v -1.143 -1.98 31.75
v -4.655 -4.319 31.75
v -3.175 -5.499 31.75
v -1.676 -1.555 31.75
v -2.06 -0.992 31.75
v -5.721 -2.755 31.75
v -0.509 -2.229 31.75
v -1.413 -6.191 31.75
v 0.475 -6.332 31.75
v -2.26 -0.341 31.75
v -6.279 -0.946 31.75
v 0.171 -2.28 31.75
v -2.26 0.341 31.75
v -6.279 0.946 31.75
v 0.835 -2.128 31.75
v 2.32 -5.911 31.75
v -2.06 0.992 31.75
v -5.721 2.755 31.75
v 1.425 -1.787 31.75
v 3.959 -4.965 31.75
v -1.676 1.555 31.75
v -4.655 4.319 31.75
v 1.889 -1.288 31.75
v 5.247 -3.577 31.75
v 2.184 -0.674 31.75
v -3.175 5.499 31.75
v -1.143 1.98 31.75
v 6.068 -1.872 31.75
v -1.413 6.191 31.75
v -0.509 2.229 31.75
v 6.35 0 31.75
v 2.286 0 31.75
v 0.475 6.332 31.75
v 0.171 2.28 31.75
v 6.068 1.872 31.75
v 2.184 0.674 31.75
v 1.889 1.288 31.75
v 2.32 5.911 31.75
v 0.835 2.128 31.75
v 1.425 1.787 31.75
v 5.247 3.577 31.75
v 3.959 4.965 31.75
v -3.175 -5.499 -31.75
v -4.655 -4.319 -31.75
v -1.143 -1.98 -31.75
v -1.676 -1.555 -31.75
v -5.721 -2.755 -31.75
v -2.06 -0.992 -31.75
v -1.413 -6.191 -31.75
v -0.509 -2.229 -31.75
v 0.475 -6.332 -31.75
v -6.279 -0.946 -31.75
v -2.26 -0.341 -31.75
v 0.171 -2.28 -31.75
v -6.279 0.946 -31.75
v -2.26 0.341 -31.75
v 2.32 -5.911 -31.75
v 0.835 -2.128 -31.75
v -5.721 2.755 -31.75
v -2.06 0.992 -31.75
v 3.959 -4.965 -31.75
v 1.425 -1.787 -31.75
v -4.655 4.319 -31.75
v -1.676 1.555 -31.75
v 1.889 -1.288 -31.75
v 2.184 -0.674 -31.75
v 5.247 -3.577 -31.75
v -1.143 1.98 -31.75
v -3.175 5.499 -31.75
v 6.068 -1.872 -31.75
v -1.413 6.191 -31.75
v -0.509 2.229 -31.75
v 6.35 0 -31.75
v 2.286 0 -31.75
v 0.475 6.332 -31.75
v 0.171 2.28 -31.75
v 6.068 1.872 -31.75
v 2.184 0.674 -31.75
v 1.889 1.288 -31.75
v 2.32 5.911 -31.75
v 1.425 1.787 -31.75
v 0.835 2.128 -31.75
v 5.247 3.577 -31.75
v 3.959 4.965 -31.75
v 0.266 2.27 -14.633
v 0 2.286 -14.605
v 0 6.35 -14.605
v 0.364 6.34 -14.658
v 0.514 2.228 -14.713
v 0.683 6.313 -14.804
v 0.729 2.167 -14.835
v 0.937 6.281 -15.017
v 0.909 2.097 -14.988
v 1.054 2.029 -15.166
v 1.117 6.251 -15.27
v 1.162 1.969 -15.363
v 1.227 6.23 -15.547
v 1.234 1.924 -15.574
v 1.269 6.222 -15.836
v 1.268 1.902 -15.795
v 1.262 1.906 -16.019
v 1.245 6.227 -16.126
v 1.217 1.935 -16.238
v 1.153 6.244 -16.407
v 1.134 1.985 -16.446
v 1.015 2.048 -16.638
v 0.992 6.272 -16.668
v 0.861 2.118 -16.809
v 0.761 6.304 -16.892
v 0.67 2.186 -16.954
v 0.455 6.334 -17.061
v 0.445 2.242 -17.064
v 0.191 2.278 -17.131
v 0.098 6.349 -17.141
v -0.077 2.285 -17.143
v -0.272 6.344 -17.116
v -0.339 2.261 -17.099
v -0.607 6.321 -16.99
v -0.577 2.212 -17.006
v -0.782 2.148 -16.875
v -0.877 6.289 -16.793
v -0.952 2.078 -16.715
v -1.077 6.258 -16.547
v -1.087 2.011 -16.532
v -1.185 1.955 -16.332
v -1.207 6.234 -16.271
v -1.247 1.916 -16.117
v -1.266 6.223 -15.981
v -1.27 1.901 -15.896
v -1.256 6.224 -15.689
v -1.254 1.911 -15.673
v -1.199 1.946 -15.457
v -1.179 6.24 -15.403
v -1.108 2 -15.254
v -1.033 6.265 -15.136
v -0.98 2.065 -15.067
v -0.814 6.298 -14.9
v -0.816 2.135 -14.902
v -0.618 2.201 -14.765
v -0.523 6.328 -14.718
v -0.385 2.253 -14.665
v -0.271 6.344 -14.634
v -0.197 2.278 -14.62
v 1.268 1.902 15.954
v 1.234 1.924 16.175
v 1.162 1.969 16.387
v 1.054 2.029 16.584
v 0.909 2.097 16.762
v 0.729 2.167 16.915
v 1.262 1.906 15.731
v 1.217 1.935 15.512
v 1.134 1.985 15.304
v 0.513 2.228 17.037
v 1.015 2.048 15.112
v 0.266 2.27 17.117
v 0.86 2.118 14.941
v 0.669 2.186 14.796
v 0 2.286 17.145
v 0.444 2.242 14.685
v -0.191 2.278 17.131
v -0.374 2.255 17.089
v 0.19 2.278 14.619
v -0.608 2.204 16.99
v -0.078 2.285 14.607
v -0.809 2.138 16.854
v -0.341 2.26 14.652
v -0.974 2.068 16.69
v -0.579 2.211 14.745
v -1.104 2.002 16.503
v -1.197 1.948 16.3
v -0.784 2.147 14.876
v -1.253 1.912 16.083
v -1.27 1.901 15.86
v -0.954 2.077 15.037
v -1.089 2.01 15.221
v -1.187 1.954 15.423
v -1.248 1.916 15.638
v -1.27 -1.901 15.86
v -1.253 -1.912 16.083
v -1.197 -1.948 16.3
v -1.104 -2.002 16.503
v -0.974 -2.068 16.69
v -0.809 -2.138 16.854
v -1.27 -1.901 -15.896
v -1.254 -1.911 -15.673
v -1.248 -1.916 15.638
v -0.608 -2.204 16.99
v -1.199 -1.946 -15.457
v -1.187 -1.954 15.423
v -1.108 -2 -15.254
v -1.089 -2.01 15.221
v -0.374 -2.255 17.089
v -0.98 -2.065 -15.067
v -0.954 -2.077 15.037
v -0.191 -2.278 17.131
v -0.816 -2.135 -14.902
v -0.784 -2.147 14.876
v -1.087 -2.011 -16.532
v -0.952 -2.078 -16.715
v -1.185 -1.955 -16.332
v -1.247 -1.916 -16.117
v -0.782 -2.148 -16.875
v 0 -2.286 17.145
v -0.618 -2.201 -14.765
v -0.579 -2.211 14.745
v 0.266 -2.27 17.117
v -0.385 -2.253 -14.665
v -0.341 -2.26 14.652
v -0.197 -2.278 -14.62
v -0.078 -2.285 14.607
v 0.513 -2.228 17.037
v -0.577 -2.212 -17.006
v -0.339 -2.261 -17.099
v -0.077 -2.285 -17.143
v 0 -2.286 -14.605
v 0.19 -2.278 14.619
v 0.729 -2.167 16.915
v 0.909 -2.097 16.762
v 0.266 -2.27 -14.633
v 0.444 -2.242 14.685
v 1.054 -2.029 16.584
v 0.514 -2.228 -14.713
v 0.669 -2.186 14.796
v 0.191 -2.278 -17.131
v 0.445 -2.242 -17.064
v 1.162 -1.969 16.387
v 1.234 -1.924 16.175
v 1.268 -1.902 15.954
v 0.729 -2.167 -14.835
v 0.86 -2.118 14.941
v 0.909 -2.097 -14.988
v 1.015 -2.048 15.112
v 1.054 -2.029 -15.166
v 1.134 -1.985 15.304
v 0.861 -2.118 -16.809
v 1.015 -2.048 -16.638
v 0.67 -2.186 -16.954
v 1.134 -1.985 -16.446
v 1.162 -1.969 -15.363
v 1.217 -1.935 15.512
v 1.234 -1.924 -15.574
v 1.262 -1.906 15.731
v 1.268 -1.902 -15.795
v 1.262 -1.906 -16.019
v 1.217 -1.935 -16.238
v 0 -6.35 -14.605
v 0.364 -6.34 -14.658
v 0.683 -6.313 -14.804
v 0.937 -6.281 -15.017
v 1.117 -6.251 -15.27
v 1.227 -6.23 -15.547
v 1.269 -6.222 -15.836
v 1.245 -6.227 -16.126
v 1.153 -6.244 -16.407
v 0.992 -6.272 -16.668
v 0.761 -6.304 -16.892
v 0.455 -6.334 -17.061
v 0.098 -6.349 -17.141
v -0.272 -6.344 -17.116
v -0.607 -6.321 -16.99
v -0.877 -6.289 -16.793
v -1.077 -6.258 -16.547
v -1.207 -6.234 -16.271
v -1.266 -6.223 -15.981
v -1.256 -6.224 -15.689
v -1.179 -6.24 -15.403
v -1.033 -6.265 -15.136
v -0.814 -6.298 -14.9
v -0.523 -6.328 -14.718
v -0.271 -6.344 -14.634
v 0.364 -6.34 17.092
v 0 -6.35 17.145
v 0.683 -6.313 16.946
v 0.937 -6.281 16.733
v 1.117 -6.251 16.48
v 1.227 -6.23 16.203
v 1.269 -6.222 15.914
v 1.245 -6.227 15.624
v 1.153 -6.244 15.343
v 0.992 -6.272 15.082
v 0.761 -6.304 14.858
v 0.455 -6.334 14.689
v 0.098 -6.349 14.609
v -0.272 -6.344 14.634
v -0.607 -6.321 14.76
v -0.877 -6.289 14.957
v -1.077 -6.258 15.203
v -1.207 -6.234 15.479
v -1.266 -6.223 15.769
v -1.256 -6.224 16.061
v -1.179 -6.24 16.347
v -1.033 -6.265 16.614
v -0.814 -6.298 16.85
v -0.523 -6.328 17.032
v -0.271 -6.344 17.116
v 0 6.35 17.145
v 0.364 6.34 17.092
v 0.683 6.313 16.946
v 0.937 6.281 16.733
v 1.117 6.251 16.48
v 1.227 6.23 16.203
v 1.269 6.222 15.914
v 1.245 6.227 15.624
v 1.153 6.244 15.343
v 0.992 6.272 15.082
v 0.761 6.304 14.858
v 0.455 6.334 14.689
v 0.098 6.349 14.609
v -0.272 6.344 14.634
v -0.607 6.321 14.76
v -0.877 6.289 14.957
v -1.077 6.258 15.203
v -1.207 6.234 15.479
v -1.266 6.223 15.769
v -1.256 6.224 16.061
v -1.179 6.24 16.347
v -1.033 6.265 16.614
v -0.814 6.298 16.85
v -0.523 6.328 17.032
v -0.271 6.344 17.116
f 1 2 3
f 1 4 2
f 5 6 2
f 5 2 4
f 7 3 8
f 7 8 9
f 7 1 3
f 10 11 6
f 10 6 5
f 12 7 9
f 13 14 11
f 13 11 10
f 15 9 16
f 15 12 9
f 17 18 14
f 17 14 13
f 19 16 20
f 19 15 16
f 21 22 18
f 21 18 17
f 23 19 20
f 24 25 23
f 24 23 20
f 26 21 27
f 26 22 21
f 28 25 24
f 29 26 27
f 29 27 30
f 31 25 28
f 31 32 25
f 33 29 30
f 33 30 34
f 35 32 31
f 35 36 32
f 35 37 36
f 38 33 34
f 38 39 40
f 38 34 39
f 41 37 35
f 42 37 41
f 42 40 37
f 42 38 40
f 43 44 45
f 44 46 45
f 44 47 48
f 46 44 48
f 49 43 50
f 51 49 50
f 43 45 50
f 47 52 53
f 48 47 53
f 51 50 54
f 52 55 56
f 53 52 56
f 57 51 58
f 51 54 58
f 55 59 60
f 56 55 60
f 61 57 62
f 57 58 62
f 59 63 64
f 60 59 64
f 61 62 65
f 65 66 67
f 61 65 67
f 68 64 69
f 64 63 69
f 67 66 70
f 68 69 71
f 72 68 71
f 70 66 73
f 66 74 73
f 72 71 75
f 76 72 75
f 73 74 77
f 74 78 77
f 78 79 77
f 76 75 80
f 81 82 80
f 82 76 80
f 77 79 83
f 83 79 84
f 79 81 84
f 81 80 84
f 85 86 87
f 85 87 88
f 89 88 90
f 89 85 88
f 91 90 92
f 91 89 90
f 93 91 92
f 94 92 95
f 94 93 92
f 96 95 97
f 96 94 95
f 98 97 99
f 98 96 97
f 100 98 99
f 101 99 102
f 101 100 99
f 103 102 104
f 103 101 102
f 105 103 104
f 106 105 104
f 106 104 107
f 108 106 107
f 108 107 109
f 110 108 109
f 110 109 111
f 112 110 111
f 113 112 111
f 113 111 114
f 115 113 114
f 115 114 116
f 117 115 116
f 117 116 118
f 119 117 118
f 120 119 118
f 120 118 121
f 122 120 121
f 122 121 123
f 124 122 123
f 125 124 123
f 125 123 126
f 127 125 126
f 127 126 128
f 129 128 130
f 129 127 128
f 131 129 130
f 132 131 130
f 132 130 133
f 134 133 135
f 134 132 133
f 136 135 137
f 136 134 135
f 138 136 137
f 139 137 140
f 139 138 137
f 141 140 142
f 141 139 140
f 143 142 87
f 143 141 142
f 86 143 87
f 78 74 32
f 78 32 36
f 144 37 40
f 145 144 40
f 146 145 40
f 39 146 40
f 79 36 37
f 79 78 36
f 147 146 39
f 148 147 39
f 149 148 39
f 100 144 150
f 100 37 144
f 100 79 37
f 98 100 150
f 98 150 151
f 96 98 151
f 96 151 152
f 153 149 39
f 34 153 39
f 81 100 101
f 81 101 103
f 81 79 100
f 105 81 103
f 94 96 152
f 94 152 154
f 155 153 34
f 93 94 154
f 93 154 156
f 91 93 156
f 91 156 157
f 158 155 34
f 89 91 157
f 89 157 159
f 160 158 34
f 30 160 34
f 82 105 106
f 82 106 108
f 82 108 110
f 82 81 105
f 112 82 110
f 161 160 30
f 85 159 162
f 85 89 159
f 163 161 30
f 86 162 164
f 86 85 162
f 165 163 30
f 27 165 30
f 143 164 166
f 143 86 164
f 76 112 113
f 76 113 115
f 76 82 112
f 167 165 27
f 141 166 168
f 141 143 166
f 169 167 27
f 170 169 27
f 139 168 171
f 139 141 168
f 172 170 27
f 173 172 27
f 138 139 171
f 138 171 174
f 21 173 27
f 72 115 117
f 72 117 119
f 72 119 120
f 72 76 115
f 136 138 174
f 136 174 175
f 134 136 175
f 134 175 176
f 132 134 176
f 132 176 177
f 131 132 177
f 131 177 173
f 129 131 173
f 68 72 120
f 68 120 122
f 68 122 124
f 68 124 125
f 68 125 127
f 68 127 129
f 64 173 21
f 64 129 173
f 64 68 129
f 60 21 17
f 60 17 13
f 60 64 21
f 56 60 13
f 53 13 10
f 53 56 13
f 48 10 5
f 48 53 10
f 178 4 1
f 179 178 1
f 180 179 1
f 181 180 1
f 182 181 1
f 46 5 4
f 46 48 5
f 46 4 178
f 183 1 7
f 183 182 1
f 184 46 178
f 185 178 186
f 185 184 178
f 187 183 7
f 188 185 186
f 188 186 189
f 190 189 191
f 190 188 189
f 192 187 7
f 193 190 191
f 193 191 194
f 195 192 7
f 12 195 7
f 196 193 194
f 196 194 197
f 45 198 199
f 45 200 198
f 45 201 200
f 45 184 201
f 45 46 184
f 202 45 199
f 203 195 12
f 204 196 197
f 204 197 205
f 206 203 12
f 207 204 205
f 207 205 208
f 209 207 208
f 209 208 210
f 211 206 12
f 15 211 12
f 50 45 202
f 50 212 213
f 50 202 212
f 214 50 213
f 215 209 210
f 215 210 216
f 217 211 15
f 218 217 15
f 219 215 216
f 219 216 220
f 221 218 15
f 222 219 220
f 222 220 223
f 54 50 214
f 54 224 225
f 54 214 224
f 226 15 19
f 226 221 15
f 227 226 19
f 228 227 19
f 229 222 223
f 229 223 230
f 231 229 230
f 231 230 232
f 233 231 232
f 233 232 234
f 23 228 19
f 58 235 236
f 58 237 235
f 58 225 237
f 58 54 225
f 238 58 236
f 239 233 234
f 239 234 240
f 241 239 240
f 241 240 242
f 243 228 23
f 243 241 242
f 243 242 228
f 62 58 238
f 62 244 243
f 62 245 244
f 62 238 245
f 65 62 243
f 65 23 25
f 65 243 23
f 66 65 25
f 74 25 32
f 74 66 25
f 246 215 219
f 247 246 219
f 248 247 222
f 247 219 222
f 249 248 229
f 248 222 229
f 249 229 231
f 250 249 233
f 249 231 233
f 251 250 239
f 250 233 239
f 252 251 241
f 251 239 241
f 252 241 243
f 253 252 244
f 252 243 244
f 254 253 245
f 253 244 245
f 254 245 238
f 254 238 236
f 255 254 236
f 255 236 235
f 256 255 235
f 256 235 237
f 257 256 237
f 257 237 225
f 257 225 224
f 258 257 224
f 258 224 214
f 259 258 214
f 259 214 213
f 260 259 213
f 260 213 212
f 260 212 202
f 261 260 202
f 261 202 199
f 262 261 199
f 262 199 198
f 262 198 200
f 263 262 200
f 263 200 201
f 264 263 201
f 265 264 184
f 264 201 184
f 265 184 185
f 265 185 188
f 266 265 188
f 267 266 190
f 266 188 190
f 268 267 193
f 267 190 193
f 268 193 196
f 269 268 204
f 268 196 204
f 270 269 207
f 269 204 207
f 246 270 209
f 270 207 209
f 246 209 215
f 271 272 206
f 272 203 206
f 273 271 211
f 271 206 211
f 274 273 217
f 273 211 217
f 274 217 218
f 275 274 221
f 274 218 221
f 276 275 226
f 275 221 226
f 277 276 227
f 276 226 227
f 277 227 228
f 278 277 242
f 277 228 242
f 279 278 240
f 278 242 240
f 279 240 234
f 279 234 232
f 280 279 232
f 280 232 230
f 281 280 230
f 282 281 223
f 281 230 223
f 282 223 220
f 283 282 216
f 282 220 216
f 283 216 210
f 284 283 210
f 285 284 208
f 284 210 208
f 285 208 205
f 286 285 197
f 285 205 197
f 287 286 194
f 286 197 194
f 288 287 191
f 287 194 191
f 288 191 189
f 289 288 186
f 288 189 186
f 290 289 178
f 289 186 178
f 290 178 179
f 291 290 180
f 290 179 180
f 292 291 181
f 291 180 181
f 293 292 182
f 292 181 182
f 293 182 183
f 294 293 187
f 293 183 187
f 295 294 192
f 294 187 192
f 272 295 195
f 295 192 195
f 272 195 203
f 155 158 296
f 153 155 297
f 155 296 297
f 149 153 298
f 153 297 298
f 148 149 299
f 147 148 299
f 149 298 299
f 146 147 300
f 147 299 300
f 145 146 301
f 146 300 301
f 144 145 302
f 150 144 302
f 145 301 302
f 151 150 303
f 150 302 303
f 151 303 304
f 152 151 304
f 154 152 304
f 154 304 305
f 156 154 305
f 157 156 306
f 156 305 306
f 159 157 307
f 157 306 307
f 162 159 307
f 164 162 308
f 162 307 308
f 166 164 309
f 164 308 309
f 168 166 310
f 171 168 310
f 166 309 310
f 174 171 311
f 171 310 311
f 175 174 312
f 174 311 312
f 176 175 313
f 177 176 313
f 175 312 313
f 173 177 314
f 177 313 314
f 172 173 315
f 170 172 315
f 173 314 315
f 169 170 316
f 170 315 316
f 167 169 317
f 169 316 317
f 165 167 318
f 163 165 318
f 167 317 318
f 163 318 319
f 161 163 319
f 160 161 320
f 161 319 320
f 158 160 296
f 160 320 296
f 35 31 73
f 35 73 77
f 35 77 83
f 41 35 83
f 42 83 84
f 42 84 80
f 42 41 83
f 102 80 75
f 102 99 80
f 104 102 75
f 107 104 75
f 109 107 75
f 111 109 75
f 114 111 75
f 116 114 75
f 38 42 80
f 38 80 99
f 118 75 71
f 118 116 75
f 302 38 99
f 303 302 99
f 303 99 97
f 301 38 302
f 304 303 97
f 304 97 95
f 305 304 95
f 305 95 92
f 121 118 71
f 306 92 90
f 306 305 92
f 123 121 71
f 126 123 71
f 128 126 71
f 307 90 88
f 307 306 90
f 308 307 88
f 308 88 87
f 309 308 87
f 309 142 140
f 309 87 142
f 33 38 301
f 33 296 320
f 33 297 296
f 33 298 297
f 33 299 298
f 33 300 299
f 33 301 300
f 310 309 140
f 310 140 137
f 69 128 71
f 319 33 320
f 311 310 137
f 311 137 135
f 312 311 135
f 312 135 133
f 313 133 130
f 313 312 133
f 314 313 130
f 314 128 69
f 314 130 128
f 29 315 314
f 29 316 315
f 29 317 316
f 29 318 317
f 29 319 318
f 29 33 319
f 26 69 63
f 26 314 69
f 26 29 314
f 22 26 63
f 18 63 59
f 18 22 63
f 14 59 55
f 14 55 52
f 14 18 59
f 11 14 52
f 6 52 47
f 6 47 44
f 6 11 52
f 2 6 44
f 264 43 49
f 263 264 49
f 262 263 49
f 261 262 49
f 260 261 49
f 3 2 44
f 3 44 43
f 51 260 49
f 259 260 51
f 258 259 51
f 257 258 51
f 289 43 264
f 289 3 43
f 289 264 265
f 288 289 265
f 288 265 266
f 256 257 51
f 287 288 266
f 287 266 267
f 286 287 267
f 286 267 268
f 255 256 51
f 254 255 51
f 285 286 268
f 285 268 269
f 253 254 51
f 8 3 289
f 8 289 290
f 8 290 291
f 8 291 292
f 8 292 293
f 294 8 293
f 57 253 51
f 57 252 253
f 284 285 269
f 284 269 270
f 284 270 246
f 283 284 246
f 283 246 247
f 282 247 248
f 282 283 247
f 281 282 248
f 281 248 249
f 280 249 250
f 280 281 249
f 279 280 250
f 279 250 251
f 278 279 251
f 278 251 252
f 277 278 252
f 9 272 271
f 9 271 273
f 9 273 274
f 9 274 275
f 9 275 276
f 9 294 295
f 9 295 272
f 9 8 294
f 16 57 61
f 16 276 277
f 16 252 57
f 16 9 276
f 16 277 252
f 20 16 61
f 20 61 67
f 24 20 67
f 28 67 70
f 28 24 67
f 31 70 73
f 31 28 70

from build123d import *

# Parameters (mm, degrees)
SKETCH1_R           = 6.35
SKETCH1_R_2         = 2.286
BOSS_EXTRUDE1_DEPTH = 31.75
SKETCH3_R           = 1.27
CUT_EXTRUDE1_DEPTH  = 31.75


with BuildPart() as part:
    # Sketch1 → Boss-Extrude1 (new, symmetric)
    with BuildSketch(Plane.XY):
        Circle(SKETCH1_R)
        Circle(SKETCH1_R_2, mode=Mode.SUBTRACT)
    extrude(amount=BOSS_EXTRUDE1_DEPTH, both=True)

    # Sketch3 → Cut-Extrude1 (cut, symmetric)
    with BuildSketch(Plane(origin=(0, 0, 0), x_dir=(1, 0, 0), z_dir=(0, 1, 0))):
        with Locations(Location((0, 15.875, 0), (0, 0, 270))):
            Circle(SKETCH3_R)
        with Locations(Location((0, -15.875, 0), (0, 0, 270))):
            Circle(SKETCH3_R)
    extrude(amount=CUT_EXTRUDE1_DEPTH, both=True, mode=Mode.SUBTRACT)


solid = part.part
